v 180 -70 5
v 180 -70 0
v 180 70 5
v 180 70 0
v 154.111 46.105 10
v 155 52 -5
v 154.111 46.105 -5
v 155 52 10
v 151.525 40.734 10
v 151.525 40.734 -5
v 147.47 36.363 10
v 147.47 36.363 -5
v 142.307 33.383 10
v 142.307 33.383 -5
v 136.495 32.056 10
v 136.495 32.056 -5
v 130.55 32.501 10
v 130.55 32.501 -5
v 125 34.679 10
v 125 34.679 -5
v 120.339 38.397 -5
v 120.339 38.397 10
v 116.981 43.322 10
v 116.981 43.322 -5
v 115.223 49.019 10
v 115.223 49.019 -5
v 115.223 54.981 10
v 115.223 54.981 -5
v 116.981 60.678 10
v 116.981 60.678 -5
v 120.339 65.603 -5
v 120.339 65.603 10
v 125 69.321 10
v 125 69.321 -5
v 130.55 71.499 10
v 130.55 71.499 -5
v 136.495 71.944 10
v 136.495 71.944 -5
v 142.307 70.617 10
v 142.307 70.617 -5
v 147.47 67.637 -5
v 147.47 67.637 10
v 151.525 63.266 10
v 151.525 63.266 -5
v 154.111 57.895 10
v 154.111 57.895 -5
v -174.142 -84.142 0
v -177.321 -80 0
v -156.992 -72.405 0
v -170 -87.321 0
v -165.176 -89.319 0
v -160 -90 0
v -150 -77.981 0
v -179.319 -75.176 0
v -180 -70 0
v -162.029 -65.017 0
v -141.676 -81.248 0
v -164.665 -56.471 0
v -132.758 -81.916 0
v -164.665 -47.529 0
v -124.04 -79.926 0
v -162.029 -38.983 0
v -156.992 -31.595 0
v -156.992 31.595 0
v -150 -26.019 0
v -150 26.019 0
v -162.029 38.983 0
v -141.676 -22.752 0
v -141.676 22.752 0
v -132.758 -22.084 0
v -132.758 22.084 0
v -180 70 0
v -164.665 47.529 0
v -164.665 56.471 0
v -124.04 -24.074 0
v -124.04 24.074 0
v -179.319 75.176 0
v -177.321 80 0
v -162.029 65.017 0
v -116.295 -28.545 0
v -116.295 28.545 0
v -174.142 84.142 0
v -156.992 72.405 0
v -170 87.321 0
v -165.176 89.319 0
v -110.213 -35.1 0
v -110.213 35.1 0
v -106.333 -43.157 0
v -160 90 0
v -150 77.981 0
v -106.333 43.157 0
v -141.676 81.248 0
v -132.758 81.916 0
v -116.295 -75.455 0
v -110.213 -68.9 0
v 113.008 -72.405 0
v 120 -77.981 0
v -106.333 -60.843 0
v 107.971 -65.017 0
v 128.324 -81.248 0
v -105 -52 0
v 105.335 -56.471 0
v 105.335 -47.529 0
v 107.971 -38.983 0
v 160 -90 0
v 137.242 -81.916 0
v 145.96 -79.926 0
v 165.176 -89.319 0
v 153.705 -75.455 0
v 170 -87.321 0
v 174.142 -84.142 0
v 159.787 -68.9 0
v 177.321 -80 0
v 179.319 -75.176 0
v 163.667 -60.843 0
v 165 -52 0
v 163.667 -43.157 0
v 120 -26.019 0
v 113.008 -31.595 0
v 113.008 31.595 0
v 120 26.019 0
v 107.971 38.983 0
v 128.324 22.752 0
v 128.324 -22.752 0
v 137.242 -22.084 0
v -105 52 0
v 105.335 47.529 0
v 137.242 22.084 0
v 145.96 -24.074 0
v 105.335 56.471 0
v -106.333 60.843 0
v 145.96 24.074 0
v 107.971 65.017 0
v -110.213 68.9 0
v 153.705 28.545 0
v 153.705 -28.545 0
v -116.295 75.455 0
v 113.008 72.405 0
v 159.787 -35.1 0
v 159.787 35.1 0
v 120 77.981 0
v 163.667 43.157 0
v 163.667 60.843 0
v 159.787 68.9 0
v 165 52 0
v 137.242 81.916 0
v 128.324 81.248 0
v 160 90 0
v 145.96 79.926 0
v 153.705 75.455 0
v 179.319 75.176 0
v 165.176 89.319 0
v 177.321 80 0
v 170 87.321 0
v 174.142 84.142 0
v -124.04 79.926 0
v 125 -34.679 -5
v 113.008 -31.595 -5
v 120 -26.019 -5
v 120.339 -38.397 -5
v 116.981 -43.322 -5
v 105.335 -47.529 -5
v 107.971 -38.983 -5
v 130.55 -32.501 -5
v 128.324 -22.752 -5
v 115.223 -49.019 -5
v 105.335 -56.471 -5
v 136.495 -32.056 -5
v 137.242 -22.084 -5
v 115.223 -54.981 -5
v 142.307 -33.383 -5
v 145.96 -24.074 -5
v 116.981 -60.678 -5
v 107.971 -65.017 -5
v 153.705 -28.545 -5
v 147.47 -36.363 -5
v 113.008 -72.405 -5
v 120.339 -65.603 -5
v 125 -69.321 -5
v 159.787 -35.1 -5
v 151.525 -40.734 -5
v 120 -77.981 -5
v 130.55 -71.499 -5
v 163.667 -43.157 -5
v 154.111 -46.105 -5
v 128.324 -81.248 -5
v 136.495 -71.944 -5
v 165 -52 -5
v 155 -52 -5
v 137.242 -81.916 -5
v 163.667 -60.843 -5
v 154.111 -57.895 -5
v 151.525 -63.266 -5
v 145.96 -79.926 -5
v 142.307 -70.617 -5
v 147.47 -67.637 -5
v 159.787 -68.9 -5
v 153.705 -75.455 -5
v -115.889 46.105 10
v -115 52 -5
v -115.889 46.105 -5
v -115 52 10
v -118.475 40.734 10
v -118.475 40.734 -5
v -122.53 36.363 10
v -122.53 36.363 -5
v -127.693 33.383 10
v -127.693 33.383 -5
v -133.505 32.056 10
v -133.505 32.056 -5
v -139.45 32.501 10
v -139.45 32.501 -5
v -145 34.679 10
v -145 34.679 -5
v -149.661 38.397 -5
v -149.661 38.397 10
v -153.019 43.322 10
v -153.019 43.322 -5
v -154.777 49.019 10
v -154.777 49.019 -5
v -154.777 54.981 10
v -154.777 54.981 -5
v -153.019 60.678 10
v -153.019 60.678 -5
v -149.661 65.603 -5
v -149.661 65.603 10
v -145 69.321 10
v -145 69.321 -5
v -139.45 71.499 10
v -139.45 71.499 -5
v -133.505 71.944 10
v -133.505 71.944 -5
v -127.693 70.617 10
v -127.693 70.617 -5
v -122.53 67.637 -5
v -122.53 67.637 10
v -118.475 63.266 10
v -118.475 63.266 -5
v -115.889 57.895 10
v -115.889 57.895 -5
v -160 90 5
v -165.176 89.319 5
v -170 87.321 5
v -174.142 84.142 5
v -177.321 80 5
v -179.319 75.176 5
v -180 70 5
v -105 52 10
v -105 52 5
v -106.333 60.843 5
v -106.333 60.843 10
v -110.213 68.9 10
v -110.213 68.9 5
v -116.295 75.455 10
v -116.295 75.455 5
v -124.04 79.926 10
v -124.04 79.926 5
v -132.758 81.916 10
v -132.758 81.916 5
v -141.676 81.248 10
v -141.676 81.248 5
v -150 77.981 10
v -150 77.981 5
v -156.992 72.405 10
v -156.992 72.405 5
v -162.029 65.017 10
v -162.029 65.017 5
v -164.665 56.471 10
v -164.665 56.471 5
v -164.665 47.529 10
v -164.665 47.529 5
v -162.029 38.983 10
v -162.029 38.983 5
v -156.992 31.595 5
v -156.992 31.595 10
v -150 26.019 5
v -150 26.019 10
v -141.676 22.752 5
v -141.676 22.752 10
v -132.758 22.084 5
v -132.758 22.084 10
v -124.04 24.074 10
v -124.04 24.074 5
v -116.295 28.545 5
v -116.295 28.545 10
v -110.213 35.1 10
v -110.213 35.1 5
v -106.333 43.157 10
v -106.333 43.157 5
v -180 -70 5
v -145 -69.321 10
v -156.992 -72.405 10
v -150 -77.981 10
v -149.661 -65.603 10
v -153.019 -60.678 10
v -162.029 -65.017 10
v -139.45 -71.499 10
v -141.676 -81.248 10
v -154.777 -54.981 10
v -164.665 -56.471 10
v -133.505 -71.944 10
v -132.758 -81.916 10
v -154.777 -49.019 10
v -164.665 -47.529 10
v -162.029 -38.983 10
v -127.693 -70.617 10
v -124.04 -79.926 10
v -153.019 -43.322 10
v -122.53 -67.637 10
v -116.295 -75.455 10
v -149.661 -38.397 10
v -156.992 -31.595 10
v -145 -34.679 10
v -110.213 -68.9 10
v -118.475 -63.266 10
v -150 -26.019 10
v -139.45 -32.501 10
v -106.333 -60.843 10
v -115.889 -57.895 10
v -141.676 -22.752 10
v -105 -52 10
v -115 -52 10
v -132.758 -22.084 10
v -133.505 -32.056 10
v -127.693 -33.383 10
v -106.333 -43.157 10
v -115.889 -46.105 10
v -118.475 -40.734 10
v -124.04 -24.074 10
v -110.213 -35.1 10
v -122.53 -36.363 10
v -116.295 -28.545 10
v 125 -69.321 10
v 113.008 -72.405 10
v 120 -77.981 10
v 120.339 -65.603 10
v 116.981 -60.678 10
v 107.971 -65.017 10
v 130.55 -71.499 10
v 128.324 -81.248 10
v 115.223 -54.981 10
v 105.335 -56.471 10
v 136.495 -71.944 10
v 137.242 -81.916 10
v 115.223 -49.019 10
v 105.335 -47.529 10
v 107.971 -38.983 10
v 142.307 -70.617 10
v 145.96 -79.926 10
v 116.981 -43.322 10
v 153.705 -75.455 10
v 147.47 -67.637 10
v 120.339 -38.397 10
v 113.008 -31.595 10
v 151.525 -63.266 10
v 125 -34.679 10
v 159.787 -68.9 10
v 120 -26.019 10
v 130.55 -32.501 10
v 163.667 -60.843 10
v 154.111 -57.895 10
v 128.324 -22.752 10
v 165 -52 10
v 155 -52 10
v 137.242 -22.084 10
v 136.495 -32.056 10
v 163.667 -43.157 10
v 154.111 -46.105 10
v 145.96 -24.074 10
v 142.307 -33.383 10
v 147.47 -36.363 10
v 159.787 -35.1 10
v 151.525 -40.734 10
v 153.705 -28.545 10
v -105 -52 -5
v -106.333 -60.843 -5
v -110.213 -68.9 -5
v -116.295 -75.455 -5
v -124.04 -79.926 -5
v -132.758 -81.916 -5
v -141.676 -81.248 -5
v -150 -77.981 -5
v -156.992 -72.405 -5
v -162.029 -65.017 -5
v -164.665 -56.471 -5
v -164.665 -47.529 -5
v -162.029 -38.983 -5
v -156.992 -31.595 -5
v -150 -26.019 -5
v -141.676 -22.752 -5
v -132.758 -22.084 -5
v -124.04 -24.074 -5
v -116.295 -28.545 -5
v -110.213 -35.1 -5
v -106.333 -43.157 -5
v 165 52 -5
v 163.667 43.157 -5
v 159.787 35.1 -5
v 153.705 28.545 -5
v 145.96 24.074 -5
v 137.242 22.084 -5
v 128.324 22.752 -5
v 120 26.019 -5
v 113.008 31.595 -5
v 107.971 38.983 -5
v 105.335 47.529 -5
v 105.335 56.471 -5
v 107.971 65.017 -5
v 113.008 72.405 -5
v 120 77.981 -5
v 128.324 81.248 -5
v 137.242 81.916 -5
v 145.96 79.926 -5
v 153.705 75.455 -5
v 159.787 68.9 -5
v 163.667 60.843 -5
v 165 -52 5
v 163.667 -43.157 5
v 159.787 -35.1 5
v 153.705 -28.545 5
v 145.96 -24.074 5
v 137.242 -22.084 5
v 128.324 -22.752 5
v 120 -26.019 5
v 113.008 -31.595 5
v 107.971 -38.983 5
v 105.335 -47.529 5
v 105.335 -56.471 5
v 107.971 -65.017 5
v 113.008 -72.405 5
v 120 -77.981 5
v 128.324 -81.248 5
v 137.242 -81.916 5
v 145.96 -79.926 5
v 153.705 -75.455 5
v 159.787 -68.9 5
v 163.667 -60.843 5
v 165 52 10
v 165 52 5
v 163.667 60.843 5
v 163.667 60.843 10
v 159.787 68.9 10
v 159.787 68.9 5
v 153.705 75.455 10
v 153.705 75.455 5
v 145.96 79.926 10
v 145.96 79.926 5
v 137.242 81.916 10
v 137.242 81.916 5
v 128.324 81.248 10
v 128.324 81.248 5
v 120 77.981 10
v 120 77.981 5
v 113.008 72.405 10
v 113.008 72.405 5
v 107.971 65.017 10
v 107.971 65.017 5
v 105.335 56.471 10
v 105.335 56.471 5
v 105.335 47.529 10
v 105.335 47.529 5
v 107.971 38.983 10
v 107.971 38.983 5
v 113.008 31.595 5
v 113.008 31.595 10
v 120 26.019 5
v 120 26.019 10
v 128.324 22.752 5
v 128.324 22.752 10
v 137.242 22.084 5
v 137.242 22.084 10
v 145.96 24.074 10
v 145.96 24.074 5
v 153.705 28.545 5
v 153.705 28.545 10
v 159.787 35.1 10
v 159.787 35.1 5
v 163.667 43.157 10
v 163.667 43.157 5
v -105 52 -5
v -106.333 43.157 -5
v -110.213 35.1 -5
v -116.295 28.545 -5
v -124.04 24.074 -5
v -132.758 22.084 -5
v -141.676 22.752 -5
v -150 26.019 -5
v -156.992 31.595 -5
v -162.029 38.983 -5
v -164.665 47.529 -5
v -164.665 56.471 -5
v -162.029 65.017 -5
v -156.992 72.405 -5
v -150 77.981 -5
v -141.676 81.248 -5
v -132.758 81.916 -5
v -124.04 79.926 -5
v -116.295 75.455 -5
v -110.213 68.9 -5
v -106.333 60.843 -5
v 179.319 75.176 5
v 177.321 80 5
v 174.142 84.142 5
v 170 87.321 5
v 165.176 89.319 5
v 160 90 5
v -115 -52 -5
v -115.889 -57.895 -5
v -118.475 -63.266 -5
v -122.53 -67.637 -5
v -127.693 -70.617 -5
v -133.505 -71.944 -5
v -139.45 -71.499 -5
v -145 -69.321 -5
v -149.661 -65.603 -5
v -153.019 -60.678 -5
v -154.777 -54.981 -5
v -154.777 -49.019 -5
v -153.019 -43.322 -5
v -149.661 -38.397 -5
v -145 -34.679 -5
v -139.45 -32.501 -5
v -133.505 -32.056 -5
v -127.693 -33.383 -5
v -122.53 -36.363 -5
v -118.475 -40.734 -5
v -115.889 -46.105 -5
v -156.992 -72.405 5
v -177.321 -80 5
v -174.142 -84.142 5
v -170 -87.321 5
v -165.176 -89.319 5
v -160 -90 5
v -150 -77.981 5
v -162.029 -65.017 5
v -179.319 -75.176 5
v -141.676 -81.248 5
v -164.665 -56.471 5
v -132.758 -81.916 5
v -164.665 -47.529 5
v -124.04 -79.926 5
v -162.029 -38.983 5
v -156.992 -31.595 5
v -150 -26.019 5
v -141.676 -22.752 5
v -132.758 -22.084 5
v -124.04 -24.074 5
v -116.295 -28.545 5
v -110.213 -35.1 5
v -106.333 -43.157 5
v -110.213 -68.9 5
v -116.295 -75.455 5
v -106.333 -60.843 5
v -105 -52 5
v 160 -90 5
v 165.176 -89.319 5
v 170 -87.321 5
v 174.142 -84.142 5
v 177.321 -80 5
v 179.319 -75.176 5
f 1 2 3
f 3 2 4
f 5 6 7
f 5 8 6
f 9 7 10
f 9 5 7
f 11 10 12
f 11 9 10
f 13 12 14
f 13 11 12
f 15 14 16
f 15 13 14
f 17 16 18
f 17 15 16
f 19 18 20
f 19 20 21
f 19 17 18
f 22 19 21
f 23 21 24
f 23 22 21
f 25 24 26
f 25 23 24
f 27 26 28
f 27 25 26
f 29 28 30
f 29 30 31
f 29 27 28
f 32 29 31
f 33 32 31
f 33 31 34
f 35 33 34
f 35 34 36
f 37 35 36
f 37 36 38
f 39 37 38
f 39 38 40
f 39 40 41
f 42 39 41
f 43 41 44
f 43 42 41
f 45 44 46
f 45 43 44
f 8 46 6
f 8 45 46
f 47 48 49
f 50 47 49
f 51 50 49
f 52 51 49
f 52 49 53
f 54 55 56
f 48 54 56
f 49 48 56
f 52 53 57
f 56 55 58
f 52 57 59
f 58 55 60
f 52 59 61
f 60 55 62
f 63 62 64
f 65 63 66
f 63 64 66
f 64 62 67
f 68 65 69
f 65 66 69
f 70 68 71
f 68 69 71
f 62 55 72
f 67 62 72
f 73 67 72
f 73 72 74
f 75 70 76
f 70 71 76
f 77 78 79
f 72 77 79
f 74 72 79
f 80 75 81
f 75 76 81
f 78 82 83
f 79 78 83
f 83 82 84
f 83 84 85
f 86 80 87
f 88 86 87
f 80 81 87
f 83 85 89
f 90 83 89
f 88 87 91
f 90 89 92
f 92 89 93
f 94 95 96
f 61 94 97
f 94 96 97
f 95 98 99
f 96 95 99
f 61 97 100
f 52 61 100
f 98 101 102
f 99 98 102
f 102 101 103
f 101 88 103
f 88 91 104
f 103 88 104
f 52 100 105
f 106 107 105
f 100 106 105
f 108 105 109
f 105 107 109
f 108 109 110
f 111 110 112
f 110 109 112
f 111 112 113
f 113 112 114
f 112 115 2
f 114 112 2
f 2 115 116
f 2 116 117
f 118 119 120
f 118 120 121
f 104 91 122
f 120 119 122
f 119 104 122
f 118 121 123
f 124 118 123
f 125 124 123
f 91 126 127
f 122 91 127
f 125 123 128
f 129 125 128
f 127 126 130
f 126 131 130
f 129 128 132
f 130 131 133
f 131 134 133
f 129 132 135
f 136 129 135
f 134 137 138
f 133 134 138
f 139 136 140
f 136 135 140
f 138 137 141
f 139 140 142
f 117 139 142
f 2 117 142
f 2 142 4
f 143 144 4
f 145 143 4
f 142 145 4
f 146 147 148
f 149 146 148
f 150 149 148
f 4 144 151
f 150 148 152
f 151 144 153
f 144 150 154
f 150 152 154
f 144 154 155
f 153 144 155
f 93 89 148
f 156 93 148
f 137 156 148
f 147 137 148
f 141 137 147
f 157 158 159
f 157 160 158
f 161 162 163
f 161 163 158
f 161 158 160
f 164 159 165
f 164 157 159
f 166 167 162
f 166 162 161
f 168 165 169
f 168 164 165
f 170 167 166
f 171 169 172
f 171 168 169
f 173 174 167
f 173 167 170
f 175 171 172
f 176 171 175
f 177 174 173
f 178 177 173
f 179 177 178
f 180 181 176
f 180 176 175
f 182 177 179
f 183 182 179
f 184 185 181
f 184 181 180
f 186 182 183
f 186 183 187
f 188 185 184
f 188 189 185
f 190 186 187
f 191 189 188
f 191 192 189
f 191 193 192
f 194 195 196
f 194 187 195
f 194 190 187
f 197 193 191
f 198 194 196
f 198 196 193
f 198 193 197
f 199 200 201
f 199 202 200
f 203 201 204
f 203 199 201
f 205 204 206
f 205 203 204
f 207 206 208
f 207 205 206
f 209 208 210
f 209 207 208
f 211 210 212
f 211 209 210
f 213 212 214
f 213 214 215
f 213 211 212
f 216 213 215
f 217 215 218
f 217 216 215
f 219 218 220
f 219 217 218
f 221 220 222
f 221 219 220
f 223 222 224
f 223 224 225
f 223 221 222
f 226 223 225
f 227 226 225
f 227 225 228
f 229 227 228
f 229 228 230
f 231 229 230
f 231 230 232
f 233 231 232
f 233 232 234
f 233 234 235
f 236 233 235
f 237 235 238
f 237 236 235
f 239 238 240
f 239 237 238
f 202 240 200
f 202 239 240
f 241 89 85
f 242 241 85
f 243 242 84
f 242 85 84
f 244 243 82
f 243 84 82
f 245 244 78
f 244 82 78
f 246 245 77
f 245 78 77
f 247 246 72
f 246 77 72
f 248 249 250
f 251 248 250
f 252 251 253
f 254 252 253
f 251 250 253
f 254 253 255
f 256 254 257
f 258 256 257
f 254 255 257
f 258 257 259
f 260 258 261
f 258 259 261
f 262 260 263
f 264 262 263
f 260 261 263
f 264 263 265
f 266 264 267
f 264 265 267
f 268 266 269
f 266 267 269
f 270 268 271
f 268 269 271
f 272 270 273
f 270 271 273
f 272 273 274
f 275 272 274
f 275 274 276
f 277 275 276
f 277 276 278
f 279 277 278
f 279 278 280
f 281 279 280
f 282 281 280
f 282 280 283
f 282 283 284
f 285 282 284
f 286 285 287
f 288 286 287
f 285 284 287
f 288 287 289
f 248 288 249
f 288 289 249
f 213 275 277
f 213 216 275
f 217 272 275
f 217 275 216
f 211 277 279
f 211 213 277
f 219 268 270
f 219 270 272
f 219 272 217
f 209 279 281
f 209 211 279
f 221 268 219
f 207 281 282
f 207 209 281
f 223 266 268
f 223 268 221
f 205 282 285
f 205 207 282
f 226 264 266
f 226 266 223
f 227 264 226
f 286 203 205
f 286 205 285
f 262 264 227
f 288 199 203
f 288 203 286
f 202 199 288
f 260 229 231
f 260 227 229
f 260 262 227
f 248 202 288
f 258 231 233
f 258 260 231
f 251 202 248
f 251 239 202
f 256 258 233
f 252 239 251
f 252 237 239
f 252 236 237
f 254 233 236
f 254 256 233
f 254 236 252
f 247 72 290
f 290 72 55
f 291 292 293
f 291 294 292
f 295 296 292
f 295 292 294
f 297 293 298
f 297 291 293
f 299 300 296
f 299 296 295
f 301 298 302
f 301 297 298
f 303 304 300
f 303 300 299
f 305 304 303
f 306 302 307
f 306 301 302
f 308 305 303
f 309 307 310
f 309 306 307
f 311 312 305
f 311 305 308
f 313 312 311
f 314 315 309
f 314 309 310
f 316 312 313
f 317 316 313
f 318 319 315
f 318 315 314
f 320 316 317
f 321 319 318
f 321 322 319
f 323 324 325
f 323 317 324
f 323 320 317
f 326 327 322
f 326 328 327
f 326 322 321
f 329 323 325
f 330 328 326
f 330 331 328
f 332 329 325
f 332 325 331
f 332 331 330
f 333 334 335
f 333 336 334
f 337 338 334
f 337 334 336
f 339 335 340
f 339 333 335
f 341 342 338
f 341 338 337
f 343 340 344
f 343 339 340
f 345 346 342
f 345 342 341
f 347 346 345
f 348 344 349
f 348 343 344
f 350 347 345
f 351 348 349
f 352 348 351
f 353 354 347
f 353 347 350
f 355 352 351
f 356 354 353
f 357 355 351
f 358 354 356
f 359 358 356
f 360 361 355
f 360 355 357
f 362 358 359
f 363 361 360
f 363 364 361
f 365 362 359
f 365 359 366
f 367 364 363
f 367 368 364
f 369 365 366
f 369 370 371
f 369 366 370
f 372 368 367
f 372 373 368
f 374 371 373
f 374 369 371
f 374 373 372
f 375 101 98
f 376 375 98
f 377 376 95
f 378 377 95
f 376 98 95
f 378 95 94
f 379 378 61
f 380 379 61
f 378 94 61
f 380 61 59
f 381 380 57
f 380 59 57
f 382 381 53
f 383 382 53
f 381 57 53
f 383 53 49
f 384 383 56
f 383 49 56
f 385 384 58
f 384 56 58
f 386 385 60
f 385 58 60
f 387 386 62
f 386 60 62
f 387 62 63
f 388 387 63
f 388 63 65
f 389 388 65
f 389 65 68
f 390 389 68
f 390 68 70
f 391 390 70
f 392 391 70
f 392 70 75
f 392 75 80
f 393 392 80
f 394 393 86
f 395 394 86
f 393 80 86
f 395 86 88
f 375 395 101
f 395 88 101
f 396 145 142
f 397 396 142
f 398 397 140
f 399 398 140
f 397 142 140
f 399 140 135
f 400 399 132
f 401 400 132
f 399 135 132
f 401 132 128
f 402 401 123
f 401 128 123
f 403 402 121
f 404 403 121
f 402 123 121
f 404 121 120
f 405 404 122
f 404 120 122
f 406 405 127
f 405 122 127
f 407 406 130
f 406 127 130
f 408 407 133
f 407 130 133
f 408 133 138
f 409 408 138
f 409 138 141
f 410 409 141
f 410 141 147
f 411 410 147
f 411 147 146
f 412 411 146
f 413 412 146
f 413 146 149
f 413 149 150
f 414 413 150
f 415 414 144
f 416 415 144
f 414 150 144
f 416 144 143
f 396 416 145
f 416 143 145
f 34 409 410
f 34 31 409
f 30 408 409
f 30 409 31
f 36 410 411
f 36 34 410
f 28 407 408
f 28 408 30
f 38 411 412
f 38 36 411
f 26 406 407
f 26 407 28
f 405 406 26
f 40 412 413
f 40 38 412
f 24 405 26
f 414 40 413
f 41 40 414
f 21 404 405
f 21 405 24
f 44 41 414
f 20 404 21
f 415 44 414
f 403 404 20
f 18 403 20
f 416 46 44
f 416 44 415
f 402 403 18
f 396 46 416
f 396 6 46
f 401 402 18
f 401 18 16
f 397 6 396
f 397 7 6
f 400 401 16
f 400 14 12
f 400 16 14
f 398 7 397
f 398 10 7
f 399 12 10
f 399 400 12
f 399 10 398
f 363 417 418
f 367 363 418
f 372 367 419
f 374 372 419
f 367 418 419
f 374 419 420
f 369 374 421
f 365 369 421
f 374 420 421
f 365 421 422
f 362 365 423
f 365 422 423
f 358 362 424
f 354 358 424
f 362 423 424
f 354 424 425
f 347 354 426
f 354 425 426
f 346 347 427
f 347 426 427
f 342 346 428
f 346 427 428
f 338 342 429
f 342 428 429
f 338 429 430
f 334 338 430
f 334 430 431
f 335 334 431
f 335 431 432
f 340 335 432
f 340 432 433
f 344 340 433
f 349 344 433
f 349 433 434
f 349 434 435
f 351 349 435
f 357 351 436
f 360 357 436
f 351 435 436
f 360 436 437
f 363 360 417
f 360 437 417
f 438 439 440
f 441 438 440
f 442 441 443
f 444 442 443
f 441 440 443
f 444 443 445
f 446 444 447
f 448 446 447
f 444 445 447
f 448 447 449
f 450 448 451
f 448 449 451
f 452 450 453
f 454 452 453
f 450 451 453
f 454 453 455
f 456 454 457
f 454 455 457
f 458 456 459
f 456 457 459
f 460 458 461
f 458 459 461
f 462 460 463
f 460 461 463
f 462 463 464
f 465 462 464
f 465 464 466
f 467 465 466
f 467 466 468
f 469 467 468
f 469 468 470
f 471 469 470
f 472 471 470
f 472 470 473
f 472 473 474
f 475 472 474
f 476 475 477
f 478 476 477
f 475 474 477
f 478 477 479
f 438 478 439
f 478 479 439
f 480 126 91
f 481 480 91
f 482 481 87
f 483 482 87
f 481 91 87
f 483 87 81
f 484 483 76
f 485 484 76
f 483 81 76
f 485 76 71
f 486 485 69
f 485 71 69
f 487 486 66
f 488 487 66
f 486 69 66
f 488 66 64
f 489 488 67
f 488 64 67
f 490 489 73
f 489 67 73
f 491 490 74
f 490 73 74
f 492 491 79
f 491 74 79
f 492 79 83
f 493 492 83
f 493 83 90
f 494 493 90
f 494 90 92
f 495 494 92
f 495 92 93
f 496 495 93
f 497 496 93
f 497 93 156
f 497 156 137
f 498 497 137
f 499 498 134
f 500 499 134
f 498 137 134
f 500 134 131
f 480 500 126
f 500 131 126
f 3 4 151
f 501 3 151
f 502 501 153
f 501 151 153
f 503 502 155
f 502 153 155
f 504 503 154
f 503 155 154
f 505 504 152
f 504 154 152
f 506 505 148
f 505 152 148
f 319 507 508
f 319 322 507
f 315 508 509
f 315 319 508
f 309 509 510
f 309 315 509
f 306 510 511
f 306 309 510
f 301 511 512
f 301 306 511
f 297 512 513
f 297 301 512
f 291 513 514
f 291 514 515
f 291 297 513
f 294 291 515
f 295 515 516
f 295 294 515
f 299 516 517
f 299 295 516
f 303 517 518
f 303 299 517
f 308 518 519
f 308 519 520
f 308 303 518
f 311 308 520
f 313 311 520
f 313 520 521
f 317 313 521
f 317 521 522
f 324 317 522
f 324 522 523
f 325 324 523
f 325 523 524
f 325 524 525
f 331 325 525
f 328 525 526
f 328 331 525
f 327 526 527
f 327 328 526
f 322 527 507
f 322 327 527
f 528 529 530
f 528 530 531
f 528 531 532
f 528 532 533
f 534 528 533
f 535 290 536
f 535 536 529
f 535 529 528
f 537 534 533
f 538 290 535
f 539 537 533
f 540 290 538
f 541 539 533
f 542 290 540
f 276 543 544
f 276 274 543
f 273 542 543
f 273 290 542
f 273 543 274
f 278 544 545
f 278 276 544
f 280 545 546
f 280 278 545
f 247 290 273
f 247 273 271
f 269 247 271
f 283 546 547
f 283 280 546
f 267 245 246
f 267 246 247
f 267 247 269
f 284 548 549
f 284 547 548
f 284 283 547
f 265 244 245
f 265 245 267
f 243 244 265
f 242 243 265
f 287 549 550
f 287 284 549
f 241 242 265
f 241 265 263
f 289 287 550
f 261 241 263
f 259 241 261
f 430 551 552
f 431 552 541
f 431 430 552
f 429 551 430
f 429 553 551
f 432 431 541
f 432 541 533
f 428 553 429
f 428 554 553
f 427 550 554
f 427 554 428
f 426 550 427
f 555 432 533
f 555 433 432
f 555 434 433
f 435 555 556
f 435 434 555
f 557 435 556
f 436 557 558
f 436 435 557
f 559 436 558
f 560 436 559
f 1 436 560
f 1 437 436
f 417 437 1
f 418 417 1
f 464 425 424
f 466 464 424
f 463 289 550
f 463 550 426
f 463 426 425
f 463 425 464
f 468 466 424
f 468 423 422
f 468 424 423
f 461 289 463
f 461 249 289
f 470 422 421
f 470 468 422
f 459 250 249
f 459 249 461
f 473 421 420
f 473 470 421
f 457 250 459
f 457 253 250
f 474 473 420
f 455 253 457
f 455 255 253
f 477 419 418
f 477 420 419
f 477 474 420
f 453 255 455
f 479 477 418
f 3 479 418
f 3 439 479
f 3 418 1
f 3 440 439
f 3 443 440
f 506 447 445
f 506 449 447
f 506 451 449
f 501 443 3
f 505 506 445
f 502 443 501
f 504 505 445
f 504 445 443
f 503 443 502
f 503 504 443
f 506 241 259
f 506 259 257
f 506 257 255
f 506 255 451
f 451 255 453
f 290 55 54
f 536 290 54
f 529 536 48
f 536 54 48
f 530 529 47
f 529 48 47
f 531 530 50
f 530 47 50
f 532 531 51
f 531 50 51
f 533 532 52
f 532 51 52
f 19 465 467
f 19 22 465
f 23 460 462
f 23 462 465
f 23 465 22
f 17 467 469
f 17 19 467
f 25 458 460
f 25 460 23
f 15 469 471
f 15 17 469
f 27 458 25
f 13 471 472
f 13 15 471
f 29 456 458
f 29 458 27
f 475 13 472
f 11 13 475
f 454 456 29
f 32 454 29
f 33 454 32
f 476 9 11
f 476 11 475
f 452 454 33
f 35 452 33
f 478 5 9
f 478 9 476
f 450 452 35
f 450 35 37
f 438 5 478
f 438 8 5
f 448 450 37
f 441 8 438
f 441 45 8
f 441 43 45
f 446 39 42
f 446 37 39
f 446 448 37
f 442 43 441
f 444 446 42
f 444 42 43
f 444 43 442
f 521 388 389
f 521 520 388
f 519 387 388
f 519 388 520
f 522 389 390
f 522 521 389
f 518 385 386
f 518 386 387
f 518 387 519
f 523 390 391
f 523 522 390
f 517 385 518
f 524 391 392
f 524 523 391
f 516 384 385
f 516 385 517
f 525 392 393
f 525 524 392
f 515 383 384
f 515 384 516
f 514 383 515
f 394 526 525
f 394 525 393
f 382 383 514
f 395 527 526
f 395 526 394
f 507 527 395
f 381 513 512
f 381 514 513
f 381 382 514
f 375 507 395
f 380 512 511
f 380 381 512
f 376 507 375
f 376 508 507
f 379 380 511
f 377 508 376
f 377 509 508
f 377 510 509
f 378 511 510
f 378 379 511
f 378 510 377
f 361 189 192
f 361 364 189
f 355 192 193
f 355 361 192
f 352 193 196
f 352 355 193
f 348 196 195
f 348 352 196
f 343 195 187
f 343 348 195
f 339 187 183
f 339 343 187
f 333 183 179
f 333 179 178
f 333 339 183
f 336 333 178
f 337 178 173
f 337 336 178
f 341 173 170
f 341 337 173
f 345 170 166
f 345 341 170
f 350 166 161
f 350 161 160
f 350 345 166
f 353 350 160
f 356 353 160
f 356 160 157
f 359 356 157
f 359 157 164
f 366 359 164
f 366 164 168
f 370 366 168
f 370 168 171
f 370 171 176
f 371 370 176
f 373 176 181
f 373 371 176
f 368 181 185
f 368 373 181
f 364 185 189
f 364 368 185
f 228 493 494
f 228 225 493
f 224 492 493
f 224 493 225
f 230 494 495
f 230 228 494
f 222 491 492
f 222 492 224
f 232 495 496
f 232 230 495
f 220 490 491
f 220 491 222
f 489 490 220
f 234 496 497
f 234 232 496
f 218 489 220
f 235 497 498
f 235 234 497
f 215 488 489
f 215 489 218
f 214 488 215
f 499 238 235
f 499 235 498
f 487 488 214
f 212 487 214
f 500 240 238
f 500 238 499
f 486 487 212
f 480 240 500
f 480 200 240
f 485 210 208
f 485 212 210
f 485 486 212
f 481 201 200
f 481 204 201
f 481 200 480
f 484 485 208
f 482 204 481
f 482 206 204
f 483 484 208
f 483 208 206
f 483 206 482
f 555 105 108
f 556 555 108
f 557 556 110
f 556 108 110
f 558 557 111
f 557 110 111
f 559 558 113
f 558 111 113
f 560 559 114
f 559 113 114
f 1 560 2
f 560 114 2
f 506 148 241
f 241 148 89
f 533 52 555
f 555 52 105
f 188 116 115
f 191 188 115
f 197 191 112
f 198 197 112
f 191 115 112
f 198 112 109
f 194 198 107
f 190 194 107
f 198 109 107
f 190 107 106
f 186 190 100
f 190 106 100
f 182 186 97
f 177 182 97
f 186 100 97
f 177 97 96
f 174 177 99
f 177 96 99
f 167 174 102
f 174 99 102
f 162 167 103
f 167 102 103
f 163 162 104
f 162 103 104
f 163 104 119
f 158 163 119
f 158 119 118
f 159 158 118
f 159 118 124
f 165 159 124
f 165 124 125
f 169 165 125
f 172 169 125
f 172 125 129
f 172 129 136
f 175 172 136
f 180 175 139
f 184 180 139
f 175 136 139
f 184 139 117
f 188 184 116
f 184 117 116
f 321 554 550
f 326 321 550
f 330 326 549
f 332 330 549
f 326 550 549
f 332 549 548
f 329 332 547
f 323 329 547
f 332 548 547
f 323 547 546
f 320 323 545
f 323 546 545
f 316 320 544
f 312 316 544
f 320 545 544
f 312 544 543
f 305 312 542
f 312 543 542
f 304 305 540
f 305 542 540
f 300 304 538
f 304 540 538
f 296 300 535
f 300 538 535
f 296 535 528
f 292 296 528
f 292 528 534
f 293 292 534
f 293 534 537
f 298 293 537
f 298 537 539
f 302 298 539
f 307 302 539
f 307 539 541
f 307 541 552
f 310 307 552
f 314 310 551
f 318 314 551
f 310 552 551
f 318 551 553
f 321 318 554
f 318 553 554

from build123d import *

# Parameters (mm, degrees)
F0_R     = 20
F1_DEPTH = 5
F2_R     = 30
F2_R_2   = 20
F3_DEPTH = 5
F4_R     = 30
F4_R_2   = 20
F5_DEPTH = 5


with BuildPart() as f1:
    # F0 (on Top) → F1 (new body)
    with BuildSketch(Plane.XY):
        with BuildLine():
            Line((-160, -90), (160, -90))
            ThreePointArc((160, -90), (174.142136, -84.142136), (180, -70))
            Line((180, -70), (180, 70))
            ThreePointArc((180, 70), (174.142136, 84.142136), (160, 90))
            Line((160, 90), (-160, 90))
            ThreePointArc((-160, 90), (-174.142136, 84.142136), (-180, 70))
            Line((-180, 70), (-180, -70))
            ThreePointArc((-180, -70), (-174.142136, -84.142136), (-160, -90))
        make_face()
        with Locations((-135, -52)):
            Circle(F0_R, mode=Mode.SUBTRACT)
        with Locations((135, -52)):
            Circle(F0_R, mode=Mode.SUBTRACT)
        with Locations((-135, 52)):
            Circle(F0_R, mode=Mode.SUBTRACT)
        with Locations((135, 52)):
            Circle(F0_R, mode=Mode.SUBTRACT)
    extrude(amount=F1_DEPTH)

    # F2 (on face) → F3 (join)
    with BuildSketch(Plane.XY.offset(5)):
        with Locations((-135, 52)):
            Circle(F2_R)
        with Locations((-135, 52)):
            Circle(F2_R_2, mode=Mode.SUBTRACT)
        with Locations((135, 52)):
            Circle(F2_R)
        with Locations((135, 52)):
            Circle(F2_R_2, mode=Mode.SUBTRACT)
        with Locations((-135, -52)):
            Circle(F2_R)
        with Locations((-135, -52)):
            Circle(F2_R_2, mode=Mode.SUBTRACT)
        with Locations((135, -52)):
            Circle(F2_R)
        with Locations((135, -52)):
            Circle(F2_R_2, mode=Mode.SUBTRACT)
    extrude(amount=F3_DEPTH)

    # F4 (on face) → F5 (join)
    with BuildSketch(Plane(origin=(0, 0, 0), x_dir=(1, 0, 0), z_dir=(0, 0, -1))):
        with Locations((-135, 52)):
            Circle(F4_R)
        with Locations((-135, 52)):
            Circle(F4_R_2, mode=Mode.SUBTRACT)
        with Locations((135, 52)):
            Circle(F4_R)
        with Locations((135, 52)):
            Circle(F4_R_2, mode=Mode.SUBTRACT)
        with Locations((-135, -52)):
            Circle(F4_R)
        with Locations((-135, -52)):
            Circle(F4_R_2, mode=Mode.SUBTRACT)
        with Locations((135, -52)):
            Circle(F4_R)
        with Locations((135, -52)):
            Circle(F4_R_2, mode=Mode.SUBTRACT)
    extrude(amount=F5_DEPTH)


solid = f1.part
